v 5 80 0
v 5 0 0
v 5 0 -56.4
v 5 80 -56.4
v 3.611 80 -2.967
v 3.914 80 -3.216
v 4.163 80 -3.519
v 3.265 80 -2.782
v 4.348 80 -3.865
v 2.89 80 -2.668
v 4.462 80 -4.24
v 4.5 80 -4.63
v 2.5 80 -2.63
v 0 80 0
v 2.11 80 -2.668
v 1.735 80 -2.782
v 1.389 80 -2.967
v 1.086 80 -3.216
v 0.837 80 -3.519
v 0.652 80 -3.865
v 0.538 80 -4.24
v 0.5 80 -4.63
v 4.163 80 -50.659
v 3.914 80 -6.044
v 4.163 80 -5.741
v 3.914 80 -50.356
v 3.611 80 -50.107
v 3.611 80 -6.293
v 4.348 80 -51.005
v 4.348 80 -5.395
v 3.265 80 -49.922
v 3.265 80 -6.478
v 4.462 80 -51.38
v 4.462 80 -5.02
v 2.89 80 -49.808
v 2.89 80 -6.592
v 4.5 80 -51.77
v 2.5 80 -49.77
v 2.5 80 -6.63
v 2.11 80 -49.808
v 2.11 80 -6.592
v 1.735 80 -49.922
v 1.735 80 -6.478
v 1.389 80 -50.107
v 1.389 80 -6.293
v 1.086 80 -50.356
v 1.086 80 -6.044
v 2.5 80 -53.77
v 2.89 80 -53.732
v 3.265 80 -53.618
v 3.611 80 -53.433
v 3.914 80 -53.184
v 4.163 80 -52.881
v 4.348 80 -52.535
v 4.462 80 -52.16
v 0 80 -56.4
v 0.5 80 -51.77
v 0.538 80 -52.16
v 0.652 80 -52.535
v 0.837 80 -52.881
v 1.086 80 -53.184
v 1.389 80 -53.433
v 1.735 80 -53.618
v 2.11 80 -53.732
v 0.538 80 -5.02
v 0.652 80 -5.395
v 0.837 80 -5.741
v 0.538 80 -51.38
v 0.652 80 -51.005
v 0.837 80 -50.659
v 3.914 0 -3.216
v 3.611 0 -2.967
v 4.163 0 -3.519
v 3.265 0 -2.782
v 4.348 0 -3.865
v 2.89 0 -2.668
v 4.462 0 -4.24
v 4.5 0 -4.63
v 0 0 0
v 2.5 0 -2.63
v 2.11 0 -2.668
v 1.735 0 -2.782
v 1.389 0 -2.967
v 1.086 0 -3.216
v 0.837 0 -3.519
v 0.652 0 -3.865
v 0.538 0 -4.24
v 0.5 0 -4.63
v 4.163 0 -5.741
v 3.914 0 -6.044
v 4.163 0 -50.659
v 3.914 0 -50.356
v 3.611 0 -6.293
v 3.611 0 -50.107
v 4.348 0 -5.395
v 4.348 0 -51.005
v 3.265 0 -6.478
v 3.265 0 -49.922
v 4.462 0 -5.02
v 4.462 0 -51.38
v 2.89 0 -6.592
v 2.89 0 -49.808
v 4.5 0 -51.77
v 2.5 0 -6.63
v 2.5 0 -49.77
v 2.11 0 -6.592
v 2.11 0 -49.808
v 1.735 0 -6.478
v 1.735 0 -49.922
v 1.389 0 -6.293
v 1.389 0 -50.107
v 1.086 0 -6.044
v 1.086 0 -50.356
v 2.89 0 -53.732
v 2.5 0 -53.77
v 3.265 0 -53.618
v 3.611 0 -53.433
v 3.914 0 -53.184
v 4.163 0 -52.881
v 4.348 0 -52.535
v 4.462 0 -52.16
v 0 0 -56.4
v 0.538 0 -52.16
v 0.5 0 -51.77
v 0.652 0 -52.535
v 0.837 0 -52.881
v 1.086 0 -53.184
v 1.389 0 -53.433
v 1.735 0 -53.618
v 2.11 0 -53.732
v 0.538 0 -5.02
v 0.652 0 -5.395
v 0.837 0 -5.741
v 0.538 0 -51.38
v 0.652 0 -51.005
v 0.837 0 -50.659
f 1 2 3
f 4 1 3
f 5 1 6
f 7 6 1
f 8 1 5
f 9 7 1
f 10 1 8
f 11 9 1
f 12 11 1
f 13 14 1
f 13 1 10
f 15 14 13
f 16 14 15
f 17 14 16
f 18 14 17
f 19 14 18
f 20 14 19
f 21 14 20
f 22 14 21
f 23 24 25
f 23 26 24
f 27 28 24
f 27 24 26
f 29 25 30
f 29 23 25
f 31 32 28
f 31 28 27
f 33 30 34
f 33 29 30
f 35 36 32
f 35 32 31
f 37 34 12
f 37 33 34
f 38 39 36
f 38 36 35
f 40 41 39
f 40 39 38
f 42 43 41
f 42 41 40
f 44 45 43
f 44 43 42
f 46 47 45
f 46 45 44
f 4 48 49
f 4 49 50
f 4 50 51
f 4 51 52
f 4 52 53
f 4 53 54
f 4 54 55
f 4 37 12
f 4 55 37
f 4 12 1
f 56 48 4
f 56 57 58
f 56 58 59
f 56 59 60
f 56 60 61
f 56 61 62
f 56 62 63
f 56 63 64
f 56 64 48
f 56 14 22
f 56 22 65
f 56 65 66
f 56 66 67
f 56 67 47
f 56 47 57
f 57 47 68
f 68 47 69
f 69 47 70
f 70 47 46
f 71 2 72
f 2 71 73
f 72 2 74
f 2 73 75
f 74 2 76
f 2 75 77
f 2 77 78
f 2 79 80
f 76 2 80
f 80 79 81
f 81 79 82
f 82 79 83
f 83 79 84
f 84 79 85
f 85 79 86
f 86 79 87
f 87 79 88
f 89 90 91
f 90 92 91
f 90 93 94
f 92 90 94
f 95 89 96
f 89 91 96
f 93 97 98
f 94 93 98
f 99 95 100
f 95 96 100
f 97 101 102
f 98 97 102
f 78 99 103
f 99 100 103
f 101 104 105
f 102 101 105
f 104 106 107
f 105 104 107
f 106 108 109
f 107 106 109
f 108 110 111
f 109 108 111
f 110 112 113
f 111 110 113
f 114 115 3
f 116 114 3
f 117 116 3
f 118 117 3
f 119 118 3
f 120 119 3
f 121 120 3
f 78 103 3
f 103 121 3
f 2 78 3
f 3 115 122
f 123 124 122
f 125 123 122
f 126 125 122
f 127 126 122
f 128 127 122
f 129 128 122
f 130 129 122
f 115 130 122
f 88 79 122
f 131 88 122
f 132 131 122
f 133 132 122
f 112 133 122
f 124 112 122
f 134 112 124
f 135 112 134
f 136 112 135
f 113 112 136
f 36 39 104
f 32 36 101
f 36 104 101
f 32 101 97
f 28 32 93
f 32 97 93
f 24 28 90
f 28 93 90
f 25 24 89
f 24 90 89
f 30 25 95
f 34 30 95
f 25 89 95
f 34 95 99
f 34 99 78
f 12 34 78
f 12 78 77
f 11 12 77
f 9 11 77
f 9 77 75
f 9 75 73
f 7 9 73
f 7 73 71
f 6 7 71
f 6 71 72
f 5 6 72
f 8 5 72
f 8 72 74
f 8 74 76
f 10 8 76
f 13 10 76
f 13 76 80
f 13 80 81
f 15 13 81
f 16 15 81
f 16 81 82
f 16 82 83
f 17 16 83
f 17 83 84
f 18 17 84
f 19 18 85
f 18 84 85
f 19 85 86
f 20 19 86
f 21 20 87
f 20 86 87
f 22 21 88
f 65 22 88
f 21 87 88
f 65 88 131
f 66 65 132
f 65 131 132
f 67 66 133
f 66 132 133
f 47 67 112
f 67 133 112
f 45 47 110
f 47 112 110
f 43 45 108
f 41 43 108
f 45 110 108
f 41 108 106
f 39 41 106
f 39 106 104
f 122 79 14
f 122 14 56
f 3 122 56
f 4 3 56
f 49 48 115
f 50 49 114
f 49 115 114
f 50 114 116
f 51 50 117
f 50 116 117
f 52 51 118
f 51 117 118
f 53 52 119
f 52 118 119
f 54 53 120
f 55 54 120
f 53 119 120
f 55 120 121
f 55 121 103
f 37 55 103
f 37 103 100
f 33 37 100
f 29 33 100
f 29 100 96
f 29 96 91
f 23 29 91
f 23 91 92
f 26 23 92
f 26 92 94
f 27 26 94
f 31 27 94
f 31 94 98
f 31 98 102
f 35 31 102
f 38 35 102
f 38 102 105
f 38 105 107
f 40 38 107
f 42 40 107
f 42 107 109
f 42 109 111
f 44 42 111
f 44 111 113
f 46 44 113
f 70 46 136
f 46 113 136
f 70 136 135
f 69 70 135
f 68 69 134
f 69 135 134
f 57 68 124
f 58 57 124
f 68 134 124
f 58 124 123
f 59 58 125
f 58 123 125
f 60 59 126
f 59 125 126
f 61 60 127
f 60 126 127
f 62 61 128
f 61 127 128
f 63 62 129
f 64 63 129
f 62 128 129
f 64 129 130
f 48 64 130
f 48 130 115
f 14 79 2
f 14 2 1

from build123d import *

# Parameters (mm, degrees)
SZKIC1_W                    = 56.4
SZKIC1_H                    = 80
DODANIE_WYCI_GNI_CIE1_DEPTH = 5
OTWORY_USTALAJ_CE_4_0MM1_D  = 4


with BuildPart() as part:
    # Szkic1 → Dodanie-wyciągnięcie1 (new body)
    with BuildSketch(Plane(origin=(0, 0, 0), x_dir=(0, 0, -1), z_dir=(1, 0, 0))):
        with Locations((28.2, 40)):
            Rectangle(SZKIC1_W, SZKIC1_H)
    extrude(amount=DODANIE_WYCI_GNI_CIE1_DEPTH)

    # Otwory ustalające Ø4.0mm1 (through all)
    with Locations(Plane(origin=(2.5, 80, -51.77), x_dir=(0, 0, 1), z_dir=(0, 1, 0))):
        with Locations((0, 0), (47.14, 0)):
            Hole(OTWORY_USTALAJ_CE_4_0MM1_D / 2)


solid = part.part
